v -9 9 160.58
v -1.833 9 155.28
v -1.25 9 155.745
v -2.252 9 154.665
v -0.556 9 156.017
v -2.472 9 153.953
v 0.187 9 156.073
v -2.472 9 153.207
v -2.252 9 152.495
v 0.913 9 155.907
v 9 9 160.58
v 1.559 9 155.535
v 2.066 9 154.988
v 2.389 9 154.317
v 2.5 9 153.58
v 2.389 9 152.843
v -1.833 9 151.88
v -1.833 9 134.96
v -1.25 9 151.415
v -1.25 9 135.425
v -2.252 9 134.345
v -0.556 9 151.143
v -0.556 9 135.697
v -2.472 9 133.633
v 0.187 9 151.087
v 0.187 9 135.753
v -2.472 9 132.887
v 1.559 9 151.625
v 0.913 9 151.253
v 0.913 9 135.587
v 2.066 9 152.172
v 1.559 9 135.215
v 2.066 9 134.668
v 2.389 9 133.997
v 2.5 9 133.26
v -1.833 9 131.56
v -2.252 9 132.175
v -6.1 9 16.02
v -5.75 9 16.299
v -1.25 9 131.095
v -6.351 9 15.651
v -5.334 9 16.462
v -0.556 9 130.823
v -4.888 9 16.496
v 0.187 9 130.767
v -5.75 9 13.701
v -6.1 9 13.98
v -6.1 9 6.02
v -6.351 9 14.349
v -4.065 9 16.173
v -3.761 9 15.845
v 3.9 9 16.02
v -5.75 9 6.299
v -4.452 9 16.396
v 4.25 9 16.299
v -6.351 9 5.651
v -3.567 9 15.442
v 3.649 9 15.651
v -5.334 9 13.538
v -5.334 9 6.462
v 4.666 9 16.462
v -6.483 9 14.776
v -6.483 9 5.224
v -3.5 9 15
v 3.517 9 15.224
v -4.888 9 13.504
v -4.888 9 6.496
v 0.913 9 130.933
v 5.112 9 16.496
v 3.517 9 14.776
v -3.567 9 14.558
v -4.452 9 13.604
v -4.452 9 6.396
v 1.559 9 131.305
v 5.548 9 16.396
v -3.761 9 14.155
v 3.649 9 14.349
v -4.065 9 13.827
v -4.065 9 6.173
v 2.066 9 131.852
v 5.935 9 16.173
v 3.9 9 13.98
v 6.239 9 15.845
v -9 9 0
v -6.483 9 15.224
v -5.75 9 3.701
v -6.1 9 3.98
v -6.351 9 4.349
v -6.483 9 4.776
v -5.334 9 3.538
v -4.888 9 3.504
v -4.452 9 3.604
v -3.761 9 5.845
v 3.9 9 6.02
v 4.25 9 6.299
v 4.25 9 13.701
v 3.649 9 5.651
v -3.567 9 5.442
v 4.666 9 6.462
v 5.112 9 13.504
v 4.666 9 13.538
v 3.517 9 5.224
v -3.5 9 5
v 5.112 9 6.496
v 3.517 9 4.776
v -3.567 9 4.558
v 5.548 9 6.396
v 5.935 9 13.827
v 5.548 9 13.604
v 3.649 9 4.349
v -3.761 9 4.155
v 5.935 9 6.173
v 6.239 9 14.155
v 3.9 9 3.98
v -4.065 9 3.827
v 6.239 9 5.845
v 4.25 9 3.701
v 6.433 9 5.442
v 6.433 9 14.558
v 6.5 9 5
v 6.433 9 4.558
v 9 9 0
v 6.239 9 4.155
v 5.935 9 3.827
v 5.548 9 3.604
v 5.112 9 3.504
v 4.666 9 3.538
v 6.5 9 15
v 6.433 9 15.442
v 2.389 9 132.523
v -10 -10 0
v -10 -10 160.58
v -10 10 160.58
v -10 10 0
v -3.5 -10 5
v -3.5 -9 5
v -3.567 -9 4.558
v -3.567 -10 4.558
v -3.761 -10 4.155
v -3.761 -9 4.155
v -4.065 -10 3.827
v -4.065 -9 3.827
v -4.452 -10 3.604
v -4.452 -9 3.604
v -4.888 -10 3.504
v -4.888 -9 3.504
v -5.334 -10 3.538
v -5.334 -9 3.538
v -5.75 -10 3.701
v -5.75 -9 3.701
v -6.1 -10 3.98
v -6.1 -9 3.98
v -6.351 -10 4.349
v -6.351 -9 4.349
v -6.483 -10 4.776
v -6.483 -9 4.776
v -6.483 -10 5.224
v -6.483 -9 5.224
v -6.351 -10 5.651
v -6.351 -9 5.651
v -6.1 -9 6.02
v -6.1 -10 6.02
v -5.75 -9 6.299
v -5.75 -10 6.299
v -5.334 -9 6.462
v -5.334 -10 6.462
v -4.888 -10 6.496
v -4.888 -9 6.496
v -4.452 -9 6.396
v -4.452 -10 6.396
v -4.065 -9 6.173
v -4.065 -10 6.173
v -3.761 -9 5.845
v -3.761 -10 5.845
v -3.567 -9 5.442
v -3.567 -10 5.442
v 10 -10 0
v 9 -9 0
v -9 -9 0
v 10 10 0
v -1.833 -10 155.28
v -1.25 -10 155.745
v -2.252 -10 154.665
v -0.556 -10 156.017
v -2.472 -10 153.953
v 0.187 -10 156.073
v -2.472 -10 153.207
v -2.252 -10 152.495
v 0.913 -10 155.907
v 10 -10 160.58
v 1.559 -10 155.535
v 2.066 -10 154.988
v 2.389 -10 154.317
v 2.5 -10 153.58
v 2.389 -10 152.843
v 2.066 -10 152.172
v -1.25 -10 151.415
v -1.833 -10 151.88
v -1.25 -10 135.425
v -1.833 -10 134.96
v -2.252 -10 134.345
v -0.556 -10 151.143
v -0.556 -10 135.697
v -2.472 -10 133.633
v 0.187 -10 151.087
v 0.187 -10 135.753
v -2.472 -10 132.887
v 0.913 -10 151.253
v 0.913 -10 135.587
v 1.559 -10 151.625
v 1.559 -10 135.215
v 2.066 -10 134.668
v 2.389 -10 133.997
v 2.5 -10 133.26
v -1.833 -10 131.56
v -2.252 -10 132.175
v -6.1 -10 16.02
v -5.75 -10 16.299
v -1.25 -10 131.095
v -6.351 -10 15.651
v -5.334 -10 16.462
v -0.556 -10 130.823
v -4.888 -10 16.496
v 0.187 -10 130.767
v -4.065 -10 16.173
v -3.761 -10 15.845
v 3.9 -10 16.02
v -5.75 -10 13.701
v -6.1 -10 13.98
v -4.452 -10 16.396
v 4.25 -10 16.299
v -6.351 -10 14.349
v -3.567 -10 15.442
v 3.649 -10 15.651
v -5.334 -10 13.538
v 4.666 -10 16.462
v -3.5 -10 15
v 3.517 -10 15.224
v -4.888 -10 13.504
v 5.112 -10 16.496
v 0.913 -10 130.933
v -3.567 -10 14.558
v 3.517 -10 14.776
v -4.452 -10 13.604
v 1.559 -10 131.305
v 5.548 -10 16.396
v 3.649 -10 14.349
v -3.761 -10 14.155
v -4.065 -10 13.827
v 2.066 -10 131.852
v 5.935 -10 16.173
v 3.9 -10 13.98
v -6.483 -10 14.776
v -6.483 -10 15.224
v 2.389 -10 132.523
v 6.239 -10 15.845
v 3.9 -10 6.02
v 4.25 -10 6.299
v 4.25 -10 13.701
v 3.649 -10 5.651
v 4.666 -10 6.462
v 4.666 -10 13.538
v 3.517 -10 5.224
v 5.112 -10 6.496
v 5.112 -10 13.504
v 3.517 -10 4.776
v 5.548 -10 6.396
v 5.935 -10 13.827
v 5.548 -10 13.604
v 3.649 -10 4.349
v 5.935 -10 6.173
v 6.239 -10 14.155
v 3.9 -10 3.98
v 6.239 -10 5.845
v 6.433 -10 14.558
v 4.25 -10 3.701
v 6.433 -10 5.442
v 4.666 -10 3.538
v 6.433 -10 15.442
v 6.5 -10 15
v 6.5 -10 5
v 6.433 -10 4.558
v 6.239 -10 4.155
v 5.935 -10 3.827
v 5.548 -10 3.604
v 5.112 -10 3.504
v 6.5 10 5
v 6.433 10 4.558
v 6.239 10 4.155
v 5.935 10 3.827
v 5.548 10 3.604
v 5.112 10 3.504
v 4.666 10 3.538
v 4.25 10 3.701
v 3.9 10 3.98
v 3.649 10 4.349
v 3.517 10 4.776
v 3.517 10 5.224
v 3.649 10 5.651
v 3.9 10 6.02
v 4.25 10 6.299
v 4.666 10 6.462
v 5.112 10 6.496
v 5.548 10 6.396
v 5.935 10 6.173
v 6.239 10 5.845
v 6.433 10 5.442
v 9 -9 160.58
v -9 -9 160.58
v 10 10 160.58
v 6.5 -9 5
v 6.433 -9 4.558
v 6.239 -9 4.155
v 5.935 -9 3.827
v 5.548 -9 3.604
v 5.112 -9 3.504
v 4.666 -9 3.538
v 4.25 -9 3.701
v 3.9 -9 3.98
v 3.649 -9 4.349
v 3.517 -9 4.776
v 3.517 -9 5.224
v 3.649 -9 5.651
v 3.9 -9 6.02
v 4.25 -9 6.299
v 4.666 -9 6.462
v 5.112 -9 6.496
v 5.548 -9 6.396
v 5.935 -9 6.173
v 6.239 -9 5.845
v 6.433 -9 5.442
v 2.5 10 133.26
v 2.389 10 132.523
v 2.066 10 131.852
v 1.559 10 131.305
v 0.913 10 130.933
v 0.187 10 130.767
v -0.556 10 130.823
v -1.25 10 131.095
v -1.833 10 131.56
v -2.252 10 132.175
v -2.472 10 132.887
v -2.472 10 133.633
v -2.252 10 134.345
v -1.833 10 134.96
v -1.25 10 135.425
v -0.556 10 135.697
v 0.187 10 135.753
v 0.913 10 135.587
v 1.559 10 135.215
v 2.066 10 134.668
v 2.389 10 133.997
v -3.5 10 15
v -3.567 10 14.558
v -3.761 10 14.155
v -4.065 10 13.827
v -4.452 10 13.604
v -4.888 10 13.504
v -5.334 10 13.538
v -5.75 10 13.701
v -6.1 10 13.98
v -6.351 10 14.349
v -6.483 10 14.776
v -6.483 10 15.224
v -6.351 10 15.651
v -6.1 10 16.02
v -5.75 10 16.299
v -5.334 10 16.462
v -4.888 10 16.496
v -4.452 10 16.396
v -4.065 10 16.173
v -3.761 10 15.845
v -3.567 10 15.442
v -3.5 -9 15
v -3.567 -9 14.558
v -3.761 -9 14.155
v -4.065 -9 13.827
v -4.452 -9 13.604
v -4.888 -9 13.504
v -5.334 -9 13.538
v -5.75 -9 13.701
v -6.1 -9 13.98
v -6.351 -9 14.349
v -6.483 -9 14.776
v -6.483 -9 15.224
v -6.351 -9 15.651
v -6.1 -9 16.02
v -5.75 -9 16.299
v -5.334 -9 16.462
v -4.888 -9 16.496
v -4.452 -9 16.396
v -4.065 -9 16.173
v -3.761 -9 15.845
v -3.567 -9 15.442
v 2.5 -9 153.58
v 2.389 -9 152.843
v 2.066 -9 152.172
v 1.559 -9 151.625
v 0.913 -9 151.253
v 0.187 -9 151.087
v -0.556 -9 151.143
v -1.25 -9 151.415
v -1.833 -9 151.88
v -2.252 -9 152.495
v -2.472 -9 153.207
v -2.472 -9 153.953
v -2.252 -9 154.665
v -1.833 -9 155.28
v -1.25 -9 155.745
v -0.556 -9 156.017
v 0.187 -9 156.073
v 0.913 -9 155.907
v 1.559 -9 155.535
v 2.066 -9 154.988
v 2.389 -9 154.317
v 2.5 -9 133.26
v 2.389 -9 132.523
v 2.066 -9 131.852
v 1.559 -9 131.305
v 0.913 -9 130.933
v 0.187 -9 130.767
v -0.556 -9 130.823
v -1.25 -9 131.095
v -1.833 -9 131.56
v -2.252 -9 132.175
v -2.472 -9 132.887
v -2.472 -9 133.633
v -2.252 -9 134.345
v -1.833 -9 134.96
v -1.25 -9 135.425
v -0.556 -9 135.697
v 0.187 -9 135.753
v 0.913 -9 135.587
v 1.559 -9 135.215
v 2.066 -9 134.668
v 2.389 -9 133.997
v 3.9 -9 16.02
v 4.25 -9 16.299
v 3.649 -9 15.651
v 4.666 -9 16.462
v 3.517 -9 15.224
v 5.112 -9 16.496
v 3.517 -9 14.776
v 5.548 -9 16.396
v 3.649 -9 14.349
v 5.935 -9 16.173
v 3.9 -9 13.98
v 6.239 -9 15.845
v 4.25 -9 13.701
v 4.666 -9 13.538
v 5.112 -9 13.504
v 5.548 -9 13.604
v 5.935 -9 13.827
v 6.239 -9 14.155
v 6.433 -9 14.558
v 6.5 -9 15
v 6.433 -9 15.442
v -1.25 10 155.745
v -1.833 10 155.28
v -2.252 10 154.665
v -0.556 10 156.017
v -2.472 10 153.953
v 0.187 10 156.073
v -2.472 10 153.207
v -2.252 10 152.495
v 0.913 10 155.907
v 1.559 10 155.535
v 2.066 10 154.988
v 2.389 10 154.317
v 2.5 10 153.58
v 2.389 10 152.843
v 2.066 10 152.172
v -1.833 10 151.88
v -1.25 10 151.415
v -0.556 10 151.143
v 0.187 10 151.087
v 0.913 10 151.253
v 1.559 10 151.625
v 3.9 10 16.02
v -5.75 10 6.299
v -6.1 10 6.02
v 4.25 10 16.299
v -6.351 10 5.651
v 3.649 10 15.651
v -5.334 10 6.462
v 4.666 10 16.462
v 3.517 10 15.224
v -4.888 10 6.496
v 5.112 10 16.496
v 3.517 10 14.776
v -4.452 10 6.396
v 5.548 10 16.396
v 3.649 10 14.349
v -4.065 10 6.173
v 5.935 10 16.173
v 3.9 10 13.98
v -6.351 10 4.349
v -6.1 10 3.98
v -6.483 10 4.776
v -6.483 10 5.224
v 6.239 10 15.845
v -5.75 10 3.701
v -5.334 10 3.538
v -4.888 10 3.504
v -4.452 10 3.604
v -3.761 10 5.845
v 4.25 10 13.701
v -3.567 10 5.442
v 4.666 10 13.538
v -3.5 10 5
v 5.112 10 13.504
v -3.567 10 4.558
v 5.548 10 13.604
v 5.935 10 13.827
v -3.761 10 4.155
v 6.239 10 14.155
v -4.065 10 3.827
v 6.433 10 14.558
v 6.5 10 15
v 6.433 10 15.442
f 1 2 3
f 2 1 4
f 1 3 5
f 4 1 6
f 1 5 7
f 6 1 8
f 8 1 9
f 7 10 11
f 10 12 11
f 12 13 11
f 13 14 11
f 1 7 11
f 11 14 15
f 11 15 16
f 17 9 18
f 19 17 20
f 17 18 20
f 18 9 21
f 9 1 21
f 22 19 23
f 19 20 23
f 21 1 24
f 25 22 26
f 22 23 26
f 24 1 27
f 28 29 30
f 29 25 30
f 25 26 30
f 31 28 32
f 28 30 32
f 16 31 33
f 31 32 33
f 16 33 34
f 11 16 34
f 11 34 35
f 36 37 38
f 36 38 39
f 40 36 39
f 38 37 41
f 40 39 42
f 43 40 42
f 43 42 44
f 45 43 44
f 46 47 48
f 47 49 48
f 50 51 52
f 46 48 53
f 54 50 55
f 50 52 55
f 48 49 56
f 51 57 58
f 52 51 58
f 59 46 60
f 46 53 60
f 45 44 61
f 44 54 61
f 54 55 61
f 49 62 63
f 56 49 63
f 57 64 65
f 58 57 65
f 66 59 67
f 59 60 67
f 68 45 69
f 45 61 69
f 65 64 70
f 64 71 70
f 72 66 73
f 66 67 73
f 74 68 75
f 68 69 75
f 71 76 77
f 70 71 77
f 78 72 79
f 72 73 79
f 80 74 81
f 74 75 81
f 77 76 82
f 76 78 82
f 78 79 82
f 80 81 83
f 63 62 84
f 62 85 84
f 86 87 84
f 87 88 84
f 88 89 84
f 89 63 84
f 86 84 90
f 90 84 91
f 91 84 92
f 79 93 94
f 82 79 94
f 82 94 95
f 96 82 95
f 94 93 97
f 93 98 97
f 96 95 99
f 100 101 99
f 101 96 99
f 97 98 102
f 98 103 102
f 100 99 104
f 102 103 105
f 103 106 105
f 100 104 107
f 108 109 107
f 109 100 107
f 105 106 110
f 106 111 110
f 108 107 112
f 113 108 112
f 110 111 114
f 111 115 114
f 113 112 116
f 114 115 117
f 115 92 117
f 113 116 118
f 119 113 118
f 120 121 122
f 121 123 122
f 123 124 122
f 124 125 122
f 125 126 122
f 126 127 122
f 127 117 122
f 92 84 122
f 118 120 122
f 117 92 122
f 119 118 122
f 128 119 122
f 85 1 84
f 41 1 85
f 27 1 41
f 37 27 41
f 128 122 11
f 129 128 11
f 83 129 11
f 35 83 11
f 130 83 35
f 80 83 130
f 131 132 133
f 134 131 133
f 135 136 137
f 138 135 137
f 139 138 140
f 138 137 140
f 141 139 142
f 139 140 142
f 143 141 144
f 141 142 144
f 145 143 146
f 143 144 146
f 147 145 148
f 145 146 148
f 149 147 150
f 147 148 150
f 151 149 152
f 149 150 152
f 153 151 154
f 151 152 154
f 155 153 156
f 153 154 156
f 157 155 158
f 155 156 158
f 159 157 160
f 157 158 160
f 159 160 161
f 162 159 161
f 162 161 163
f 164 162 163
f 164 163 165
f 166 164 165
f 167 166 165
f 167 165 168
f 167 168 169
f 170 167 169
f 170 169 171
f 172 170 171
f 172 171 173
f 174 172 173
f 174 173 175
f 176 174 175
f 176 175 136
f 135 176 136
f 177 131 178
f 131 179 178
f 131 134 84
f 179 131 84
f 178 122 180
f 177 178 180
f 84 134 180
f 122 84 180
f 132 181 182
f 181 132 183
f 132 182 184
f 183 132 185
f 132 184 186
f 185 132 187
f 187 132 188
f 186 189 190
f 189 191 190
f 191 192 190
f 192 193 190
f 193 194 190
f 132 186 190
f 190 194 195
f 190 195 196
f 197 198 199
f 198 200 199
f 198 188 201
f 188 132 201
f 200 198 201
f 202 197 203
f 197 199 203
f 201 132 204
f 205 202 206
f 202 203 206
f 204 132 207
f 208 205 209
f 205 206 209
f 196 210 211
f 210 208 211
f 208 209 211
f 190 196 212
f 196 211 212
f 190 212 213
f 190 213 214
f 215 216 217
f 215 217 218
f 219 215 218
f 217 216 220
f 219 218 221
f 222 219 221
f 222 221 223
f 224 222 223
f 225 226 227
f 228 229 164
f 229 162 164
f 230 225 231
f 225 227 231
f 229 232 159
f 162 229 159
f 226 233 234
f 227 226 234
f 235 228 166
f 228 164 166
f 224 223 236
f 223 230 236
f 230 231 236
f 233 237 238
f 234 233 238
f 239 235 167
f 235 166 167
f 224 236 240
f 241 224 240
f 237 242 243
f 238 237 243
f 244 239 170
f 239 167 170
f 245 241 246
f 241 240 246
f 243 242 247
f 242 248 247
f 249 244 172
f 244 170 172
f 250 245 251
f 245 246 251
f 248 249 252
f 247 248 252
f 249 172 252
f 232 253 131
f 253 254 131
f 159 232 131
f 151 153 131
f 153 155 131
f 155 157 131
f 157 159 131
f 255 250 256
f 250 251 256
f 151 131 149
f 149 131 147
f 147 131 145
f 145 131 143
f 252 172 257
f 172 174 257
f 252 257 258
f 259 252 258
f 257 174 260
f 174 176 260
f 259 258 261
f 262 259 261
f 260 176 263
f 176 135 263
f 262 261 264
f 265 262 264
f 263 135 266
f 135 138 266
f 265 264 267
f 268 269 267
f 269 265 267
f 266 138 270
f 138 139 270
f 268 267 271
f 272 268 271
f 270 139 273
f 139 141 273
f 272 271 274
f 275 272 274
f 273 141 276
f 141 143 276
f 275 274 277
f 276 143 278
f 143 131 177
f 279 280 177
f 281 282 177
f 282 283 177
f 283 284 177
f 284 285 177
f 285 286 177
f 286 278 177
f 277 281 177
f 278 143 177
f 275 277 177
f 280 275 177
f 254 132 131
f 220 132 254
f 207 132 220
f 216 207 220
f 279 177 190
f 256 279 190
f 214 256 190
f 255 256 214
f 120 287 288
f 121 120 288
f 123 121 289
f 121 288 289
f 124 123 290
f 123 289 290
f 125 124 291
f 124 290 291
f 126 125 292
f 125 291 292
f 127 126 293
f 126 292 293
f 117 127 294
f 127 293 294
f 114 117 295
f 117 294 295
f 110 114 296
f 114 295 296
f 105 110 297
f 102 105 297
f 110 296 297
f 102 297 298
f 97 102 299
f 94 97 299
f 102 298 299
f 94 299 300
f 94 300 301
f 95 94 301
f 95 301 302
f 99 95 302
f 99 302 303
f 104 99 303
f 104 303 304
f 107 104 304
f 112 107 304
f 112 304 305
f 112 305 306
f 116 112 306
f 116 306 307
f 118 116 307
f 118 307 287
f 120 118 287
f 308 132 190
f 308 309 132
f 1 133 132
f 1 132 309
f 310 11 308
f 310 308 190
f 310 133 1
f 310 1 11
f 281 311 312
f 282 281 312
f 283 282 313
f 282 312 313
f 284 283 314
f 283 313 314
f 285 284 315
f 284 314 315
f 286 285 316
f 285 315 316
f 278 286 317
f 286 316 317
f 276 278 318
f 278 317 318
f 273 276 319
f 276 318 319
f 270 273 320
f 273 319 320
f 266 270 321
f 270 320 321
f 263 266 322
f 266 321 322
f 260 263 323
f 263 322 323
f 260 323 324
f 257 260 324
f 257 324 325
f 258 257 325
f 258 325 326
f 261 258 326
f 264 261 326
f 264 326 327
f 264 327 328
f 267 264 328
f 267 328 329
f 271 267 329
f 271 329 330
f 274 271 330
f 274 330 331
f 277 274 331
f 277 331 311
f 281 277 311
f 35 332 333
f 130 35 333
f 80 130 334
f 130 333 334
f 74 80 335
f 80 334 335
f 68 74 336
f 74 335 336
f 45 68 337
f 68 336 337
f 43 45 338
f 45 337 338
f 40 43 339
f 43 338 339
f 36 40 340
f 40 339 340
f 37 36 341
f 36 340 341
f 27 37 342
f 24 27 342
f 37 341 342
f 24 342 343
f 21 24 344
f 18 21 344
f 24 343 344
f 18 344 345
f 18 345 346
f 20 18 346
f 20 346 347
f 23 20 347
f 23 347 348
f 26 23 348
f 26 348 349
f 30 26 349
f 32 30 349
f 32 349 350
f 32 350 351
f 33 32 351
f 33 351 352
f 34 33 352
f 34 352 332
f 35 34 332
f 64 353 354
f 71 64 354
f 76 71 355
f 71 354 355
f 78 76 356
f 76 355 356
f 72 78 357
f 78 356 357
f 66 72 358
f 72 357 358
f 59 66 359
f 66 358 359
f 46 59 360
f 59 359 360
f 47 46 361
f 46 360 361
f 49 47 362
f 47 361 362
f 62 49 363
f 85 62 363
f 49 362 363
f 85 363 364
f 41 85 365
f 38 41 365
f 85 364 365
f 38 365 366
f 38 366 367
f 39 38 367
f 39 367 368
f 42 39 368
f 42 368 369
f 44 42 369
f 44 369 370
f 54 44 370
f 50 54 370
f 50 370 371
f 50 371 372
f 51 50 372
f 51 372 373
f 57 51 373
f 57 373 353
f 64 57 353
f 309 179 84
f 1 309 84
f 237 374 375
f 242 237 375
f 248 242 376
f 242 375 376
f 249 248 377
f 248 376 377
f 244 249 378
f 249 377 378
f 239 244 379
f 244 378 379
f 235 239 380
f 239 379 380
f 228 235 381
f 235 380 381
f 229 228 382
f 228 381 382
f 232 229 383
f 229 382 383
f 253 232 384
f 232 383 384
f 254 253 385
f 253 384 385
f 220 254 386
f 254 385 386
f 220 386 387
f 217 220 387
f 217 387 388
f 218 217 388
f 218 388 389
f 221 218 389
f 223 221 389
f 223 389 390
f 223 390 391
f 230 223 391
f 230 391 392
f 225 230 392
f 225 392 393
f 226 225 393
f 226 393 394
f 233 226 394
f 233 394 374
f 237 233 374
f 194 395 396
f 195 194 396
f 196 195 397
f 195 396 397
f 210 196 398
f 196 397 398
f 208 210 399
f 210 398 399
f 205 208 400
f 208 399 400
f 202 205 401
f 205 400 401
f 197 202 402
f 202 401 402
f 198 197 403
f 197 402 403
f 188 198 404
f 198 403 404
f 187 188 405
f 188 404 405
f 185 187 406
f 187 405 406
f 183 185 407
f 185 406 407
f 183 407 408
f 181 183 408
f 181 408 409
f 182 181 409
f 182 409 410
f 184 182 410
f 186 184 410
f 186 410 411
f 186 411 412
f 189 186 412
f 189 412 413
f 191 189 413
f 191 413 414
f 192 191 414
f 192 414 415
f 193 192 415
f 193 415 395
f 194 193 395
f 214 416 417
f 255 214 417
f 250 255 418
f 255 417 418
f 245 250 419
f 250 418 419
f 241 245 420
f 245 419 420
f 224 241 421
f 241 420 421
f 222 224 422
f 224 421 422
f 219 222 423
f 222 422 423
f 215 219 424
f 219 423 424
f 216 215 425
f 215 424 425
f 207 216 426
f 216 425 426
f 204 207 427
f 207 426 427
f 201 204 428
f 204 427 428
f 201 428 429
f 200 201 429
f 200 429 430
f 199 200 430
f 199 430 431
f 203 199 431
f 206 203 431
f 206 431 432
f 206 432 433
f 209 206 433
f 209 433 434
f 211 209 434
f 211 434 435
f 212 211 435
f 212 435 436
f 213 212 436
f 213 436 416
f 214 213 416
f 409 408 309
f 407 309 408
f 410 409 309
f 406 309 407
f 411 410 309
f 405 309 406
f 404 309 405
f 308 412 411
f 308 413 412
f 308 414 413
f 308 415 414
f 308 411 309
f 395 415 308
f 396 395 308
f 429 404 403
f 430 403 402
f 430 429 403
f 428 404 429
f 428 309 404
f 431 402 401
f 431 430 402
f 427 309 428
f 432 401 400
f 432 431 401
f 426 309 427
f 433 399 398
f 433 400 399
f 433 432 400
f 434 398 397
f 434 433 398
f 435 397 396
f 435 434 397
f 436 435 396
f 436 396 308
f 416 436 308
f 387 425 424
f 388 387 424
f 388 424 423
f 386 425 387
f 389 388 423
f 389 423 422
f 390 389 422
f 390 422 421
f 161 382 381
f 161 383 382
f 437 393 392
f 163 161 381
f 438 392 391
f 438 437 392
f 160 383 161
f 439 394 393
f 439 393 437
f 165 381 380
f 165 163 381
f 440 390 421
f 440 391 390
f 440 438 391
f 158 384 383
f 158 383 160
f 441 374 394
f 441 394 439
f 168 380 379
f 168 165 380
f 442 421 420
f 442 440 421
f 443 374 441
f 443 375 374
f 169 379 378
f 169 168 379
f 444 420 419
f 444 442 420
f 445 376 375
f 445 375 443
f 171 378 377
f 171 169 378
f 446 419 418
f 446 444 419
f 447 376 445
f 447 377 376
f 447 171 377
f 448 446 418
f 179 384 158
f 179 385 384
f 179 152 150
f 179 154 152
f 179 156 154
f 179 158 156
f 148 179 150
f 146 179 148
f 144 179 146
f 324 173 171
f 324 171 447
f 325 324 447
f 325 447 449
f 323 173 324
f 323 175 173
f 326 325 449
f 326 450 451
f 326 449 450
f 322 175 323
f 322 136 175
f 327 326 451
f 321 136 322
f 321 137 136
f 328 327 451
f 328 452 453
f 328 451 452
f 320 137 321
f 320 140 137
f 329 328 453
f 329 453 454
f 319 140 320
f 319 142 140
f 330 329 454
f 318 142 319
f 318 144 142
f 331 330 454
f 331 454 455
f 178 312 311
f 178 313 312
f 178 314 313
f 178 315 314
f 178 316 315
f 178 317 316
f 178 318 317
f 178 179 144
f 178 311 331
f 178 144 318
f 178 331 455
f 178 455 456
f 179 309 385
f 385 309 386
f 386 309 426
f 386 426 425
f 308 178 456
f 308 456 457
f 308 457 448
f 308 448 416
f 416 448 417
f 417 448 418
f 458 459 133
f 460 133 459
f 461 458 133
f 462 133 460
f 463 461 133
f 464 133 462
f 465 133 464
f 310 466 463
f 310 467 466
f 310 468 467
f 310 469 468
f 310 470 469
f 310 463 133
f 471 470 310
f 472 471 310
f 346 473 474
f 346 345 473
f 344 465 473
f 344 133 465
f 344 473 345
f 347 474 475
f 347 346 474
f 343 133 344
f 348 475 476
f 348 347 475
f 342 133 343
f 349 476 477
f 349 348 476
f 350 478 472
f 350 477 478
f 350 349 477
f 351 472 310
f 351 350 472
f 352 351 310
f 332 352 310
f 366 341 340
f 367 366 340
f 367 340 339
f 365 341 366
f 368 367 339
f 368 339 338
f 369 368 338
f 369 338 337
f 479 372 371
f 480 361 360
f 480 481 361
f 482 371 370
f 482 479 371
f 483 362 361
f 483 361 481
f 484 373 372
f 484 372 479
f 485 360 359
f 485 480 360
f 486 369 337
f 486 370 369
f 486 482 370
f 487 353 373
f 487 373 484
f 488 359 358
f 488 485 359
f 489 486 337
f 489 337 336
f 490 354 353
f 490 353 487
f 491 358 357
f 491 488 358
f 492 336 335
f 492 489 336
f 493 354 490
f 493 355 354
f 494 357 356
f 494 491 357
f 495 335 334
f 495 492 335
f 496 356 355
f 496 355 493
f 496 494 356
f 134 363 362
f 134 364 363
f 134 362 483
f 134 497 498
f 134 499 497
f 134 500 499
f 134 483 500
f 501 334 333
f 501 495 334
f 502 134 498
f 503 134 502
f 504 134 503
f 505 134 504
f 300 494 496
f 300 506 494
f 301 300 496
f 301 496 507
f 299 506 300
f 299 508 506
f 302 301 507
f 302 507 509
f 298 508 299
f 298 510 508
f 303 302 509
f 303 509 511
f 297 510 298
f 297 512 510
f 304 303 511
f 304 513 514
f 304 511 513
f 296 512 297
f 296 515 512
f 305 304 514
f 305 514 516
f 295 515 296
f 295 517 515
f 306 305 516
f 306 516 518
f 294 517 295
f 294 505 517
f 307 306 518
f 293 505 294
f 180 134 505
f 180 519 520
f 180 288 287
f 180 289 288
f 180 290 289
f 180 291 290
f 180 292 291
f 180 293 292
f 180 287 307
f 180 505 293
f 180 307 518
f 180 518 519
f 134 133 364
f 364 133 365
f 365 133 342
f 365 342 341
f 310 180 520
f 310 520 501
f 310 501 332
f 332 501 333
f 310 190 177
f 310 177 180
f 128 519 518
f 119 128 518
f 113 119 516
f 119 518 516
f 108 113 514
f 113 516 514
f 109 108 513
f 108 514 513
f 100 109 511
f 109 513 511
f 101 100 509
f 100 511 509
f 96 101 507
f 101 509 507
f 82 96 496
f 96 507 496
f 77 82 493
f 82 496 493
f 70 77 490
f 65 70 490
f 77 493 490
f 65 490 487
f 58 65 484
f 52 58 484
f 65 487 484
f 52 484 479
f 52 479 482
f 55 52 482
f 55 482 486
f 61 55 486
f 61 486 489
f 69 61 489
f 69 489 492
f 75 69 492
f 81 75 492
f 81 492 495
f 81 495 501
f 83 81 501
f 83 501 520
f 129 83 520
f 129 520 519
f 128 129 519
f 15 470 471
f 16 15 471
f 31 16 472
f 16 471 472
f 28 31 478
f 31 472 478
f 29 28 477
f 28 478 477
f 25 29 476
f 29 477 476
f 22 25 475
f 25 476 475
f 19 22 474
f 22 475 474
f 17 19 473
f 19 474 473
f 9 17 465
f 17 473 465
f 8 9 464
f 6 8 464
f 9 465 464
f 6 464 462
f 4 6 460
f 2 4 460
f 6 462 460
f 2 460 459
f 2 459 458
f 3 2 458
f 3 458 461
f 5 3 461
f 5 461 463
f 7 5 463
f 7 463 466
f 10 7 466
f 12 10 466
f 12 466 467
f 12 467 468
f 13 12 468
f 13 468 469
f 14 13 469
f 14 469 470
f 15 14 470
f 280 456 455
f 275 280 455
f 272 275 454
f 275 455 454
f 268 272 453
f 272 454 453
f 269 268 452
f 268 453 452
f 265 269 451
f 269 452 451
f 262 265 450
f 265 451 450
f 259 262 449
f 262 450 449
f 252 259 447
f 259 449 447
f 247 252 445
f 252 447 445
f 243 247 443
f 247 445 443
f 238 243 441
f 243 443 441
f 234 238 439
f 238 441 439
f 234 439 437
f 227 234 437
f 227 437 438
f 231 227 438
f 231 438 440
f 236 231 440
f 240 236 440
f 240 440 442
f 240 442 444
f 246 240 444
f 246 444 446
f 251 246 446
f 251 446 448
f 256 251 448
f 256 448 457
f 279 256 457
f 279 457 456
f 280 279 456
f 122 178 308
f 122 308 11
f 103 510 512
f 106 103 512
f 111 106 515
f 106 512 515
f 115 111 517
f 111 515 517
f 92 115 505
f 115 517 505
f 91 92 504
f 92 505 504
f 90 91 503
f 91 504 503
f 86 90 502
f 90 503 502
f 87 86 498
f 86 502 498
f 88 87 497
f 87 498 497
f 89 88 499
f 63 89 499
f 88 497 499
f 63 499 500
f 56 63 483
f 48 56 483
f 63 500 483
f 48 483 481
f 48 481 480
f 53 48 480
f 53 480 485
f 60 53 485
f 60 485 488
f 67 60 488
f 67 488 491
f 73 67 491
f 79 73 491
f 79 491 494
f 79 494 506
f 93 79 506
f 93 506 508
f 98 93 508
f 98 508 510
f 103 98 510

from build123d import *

# Parameters (mm, degrees)
SKETCH_1_W          = 20
SKETCH_1_H          = 20
SKETCH_1_W_2        = 18
SKETCH_1_H_2        = 18
EXTRUDE_1_DEPTH     = 171.98
SKETCH_2_R          = 1.5
CUT_EXTRUDE_1_DEPTH = 50
SKETCH_4_W          = 20
SKETCH_4_H          = 8.4
CUT_EXTRUDE_2_DEPTH = 21
SKETCH_5_R          = 2.5
CUT_EXTRUDE_3_DEPTH = 36
SKETCH_6_W          = 20
SKETCH_6_H          = 3
CUT_EXTRUDE_4_DEPTH = 33


with BuildPart() as part:
    # 草图1 → 凸台-拉伸1 (new body)
    with BuildSketch(Plane.XY):
        Rectangle(SKETCH_1_W, SKETCH_1_H)
        Rectangle(SKETCH_1_W_2, SKETCH_1_H_2, mode=Mode.SUBTRACT)
    extrude(amount=EXTRUDE_1_DEPTH)

    # 草图2 → 切除-拉伸1 (cut)
    with BuildSketch(Plane(origin=(0, 10, 0), x_dir=(1, 0, 0), z_dir=(0, 1, 0))):
        with Locations((-5, -5)):
            Circle(SKETCH_2_R)
        with Locations((5, -5)):
            Circle(SKETCH_2_R)
        with Locations((-5, -15)):
            Circle(SKETCH_2_R)
        with Locations((5, -15)):
            Circle(SKETCH_2_R)
        with Locations((-5, -235)):
            Circle(SKETCH_2_R)
        with Locations((5, -245)):
            Circle(SKETCH_2_R)
        with Locations((5, -235)):
            Circle(SKETCH_2_R)
        with Locations((-5, -245)):
            Circle(SKETCH_2_R)
    extrude(amount=-CUT_EXTRUDE_1_DEPTH, mode=Mode.SUBTRACT)

    # 草图4 → 切除-拉伸2 (cut, through all)
    with BuildSketch(Plane.XZ.offset(10)):
        with Locations((0, 167.78)):
            Rectangle(SKETCH_4_W, SKETCH_4_H)
    extrude(amount=-CUT_EXTRUDE_2_DEPTH, mode=Mode.SUBTRACT)

    # 草图5 → 切除-拉伸3 (cut)
    with BuildSketch(Plane(origin=(0, 10, 0), x_dir=(1, 0, 0), z_dir=(0, 1, 0))):
        with Locations((0, -153.58)):
            Circle(SKETCH_5_R)
        with Locations((0, -133.26)):
            Circle(SKETCH_5_R)
    extrude(amount=-CUT_EXTRUDE_3_DEPTH, mode=Mode.SUBTRACT)

    # 草图6 → 切除-拉伸4 (cut)
    with BuildSketch(Plane(origin=(0, 10, 0), x_dir=(1, 0, 0), z_dir=(0, 1, 0))):
        with Locations((0, -162.08)):
            Rectangle(SKETCH_6_W, SKETCH_6_H)
    extrude(amount=-CUT_EXTRUDE_4_DEPTH, mode=Mode.SUBTRACT)


solid = part.part
